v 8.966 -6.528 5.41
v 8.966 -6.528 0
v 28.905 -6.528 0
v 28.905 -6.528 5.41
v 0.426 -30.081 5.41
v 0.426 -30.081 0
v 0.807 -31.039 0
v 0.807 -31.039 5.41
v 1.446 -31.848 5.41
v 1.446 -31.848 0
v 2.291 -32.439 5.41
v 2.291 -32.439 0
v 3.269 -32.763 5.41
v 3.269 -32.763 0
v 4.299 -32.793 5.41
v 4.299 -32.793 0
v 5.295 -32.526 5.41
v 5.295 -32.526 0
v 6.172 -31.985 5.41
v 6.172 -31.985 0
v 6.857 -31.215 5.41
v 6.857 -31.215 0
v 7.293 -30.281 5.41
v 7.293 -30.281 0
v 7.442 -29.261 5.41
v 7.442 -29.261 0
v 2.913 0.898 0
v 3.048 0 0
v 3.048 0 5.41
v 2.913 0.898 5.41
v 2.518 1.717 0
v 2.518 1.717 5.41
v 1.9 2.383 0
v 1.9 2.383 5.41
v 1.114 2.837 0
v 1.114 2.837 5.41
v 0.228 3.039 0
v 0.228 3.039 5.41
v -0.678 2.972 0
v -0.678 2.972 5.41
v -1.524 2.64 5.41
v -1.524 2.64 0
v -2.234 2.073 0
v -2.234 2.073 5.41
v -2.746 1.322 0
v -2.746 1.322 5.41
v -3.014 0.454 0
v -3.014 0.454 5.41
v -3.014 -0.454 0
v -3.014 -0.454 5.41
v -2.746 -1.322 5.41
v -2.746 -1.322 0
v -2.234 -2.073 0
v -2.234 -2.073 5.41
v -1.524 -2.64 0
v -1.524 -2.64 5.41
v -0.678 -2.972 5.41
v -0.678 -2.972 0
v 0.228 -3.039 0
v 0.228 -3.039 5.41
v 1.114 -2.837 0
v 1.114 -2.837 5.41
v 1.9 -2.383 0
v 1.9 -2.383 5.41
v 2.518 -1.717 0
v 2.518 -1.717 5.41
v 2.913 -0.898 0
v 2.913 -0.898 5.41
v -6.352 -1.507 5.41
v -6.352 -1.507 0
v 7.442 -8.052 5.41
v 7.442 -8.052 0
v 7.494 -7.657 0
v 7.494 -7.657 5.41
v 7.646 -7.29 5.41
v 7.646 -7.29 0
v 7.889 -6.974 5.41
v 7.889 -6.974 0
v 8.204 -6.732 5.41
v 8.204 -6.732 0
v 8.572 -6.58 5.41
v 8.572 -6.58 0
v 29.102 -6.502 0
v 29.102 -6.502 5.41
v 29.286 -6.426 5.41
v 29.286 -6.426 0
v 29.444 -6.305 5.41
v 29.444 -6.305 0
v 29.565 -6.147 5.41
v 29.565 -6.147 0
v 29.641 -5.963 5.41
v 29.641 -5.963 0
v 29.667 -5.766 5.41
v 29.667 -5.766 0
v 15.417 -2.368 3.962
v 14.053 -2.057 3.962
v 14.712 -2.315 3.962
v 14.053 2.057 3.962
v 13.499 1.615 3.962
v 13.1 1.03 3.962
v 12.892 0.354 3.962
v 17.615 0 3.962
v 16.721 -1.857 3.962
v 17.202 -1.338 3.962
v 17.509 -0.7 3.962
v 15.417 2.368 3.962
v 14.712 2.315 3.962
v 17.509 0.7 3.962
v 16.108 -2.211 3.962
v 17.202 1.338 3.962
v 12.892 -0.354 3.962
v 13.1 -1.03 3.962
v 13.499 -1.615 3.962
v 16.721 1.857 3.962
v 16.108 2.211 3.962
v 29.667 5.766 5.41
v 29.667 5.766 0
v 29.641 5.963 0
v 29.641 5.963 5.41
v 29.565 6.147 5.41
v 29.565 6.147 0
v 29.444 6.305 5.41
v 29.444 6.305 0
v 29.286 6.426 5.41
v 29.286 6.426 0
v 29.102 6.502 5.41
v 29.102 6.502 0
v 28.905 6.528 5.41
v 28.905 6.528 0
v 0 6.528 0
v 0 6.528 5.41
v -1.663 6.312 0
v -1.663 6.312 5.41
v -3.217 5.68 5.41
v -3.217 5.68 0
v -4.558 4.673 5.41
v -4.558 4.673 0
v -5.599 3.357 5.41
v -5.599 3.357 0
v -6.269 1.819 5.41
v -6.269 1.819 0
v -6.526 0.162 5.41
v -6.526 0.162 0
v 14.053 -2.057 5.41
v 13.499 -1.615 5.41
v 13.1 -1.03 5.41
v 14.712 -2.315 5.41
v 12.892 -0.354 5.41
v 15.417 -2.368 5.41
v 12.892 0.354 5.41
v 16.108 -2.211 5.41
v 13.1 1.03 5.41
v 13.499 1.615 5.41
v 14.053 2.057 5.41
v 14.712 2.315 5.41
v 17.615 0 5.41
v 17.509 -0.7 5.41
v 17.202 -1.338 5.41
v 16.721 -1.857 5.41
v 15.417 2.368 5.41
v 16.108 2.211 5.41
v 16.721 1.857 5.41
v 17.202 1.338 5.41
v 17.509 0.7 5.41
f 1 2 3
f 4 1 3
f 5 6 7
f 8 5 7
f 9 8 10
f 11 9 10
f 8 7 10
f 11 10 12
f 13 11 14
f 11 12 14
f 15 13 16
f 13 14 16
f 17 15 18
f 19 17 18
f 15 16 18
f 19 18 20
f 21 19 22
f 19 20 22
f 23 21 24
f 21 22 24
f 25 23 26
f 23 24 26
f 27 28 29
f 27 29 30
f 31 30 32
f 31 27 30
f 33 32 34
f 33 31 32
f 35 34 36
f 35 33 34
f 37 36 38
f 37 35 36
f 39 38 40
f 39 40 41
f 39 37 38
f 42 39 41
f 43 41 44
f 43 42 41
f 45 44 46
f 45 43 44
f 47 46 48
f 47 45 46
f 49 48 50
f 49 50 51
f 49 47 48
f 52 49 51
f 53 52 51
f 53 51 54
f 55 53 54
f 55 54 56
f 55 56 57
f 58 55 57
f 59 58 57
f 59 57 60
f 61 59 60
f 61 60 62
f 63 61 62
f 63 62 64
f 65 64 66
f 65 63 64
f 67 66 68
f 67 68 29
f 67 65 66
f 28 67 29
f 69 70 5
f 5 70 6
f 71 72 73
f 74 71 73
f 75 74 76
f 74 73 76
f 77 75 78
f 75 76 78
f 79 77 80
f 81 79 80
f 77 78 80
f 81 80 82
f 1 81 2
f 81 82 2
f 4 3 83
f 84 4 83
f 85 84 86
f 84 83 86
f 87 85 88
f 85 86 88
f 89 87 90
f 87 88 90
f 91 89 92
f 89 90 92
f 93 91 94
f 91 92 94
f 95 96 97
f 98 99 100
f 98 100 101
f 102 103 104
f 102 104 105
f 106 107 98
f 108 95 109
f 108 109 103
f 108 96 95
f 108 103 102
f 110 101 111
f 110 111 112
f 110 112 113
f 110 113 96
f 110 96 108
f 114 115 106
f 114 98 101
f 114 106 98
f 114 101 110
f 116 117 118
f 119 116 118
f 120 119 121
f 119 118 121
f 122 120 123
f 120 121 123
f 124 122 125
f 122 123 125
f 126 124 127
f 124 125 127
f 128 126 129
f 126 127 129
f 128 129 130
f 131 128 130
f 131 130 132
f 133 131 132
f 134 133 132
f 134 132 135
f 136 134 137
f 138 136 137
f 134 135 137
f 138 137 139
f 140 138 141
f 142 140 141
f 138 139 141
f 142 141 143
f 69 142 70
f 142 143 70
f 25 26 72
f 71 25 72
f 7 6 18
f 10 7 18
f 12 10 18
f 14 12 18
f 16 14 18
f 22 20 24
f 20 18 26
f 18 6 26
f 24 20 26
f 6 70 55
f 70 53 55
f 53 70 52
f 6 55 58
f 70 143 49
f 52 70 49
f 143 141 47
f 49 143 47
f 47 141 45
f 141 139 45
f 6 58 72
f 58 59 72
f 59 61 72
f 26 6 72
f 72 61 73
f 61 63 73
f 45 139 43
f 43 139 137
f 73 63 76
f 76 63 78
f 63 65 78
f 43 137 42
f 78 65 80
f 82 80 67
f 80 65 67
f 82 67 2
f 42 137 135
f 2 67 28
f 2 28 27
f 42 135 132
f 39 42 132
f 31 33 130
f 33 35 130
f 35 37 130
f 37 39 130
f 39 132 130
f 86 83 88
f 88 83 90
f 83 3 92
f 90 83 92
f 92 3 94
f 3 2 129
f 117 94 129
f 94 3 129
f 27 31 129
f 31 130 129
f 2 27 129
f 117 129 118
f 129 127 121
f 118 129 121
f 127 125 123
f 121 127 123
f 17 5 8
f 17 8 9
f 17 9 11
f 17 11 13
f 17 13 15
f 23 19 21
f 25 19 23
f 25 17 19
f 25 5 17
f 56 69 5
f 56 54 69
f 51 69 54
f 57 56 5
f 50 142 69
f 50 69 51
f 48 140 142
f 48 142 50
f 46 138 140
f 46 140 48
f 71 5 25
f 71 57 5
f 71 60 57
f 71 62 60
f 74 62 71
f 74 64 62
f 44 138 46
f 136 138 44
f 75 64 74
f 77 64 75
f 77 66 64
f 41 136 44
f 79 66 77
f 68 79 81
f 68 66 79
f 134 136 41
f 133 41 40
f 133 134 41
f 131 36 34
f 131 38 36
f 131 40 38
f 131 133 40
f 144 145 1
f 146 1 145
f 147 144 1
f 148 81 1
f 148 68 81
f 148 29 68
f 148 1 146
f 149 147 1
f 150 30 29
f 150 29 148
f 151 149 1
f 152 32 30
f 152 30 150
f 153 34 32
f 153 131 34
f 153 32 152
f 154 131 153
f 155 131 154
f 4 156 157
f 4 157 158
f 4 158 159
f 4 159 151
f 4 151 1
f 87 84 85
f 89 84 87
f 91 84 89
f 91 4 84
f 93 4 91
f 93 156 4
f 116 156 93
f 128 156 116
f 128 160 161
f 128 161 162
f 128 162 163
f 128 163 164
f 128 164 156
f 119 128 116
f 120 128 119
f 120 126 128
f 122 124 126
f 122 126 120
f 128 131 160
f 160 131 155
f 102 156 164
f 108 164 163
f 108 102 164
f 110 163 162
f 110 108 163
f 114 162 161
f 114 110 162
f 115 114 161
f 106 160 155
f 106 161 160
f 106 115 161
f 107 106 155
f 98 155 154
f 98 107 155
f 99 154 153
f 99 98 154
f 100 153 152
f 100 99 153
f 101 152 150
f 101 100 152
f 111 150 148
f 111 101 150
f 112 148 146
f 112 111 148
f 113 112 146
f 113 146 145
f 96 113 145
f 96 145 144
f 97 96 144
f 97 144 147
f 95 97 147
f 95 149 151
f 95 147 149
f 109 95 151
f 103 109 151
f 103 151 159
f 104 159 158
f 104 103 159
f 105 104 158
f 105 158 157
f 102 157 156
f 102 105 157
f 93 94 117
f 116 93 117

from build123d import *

# Parameters (mm, degrees)
F0_R     = 3.048
F0_R_2   = 2.3749
F1_DEPTH = 5.4102
F2_START = 3.9624
F2_DEPTH = 21.4376


with BuildPart() as f1:
    # F0 (on Top) → F1 (new body)
    with BuildSketch(Plane.XY):
        with BuildLine():
            Line((28.9052, 6.5278), (0, 6.5278))
            ThreePointArc((0, 6.5278), (-5.1208699041, 4.048316226), (-6.351573493, -1.506548042))
            Line((-6.351573493, -1.506548042), (0.4261988754, -30.0814876494))
            ThreePointArc((0.4261988754, -30.0814876494), (4.2993416228, -32.7927187419), (7.4422, -29.2608))
            Line((7.4422, -29.2608), (7.4422, -8.0518))
            ThreePointArc((7.4422, -8.0518), (7.8885692655, -6.9741692655), (8.9662, -6.5278))
            Line((8.9662, -6.5278), (28.9052, -6.5278))
            ThreePointArc((28.9052, -6.5278), (29.4440153673, -6.3046153673), (29.6672, -5.7658))
            Line((29.6672, -5.7658), (29.6672, 5.7658))
            ThreePointArc((29.6672, 5.7658), (29.4440153673, 6.3046153673), (28.9052, 6.5278))
        make_face()
        Circle(F0_R, mode=Mode.SUBTRACT)
        with Locations((15.24, 0)):
            Circle(F0_R_2, mode=Mode.SUBTRACT)
        with Locations((15.24, 0)):
            Circle(F0_R_2)
    extrude(amount=F1_DEPTH)

    # F0 (on Top) → F2 (cut)
    with BuildSketch(Plane.XY.offset(F2_START)):
        with Locations((15.24, 0)):
            Circle(F0_R_2)
    extrude(amount=F2_DEPTH, mode=Mode.SUBTRACT)


solid = f1.part
